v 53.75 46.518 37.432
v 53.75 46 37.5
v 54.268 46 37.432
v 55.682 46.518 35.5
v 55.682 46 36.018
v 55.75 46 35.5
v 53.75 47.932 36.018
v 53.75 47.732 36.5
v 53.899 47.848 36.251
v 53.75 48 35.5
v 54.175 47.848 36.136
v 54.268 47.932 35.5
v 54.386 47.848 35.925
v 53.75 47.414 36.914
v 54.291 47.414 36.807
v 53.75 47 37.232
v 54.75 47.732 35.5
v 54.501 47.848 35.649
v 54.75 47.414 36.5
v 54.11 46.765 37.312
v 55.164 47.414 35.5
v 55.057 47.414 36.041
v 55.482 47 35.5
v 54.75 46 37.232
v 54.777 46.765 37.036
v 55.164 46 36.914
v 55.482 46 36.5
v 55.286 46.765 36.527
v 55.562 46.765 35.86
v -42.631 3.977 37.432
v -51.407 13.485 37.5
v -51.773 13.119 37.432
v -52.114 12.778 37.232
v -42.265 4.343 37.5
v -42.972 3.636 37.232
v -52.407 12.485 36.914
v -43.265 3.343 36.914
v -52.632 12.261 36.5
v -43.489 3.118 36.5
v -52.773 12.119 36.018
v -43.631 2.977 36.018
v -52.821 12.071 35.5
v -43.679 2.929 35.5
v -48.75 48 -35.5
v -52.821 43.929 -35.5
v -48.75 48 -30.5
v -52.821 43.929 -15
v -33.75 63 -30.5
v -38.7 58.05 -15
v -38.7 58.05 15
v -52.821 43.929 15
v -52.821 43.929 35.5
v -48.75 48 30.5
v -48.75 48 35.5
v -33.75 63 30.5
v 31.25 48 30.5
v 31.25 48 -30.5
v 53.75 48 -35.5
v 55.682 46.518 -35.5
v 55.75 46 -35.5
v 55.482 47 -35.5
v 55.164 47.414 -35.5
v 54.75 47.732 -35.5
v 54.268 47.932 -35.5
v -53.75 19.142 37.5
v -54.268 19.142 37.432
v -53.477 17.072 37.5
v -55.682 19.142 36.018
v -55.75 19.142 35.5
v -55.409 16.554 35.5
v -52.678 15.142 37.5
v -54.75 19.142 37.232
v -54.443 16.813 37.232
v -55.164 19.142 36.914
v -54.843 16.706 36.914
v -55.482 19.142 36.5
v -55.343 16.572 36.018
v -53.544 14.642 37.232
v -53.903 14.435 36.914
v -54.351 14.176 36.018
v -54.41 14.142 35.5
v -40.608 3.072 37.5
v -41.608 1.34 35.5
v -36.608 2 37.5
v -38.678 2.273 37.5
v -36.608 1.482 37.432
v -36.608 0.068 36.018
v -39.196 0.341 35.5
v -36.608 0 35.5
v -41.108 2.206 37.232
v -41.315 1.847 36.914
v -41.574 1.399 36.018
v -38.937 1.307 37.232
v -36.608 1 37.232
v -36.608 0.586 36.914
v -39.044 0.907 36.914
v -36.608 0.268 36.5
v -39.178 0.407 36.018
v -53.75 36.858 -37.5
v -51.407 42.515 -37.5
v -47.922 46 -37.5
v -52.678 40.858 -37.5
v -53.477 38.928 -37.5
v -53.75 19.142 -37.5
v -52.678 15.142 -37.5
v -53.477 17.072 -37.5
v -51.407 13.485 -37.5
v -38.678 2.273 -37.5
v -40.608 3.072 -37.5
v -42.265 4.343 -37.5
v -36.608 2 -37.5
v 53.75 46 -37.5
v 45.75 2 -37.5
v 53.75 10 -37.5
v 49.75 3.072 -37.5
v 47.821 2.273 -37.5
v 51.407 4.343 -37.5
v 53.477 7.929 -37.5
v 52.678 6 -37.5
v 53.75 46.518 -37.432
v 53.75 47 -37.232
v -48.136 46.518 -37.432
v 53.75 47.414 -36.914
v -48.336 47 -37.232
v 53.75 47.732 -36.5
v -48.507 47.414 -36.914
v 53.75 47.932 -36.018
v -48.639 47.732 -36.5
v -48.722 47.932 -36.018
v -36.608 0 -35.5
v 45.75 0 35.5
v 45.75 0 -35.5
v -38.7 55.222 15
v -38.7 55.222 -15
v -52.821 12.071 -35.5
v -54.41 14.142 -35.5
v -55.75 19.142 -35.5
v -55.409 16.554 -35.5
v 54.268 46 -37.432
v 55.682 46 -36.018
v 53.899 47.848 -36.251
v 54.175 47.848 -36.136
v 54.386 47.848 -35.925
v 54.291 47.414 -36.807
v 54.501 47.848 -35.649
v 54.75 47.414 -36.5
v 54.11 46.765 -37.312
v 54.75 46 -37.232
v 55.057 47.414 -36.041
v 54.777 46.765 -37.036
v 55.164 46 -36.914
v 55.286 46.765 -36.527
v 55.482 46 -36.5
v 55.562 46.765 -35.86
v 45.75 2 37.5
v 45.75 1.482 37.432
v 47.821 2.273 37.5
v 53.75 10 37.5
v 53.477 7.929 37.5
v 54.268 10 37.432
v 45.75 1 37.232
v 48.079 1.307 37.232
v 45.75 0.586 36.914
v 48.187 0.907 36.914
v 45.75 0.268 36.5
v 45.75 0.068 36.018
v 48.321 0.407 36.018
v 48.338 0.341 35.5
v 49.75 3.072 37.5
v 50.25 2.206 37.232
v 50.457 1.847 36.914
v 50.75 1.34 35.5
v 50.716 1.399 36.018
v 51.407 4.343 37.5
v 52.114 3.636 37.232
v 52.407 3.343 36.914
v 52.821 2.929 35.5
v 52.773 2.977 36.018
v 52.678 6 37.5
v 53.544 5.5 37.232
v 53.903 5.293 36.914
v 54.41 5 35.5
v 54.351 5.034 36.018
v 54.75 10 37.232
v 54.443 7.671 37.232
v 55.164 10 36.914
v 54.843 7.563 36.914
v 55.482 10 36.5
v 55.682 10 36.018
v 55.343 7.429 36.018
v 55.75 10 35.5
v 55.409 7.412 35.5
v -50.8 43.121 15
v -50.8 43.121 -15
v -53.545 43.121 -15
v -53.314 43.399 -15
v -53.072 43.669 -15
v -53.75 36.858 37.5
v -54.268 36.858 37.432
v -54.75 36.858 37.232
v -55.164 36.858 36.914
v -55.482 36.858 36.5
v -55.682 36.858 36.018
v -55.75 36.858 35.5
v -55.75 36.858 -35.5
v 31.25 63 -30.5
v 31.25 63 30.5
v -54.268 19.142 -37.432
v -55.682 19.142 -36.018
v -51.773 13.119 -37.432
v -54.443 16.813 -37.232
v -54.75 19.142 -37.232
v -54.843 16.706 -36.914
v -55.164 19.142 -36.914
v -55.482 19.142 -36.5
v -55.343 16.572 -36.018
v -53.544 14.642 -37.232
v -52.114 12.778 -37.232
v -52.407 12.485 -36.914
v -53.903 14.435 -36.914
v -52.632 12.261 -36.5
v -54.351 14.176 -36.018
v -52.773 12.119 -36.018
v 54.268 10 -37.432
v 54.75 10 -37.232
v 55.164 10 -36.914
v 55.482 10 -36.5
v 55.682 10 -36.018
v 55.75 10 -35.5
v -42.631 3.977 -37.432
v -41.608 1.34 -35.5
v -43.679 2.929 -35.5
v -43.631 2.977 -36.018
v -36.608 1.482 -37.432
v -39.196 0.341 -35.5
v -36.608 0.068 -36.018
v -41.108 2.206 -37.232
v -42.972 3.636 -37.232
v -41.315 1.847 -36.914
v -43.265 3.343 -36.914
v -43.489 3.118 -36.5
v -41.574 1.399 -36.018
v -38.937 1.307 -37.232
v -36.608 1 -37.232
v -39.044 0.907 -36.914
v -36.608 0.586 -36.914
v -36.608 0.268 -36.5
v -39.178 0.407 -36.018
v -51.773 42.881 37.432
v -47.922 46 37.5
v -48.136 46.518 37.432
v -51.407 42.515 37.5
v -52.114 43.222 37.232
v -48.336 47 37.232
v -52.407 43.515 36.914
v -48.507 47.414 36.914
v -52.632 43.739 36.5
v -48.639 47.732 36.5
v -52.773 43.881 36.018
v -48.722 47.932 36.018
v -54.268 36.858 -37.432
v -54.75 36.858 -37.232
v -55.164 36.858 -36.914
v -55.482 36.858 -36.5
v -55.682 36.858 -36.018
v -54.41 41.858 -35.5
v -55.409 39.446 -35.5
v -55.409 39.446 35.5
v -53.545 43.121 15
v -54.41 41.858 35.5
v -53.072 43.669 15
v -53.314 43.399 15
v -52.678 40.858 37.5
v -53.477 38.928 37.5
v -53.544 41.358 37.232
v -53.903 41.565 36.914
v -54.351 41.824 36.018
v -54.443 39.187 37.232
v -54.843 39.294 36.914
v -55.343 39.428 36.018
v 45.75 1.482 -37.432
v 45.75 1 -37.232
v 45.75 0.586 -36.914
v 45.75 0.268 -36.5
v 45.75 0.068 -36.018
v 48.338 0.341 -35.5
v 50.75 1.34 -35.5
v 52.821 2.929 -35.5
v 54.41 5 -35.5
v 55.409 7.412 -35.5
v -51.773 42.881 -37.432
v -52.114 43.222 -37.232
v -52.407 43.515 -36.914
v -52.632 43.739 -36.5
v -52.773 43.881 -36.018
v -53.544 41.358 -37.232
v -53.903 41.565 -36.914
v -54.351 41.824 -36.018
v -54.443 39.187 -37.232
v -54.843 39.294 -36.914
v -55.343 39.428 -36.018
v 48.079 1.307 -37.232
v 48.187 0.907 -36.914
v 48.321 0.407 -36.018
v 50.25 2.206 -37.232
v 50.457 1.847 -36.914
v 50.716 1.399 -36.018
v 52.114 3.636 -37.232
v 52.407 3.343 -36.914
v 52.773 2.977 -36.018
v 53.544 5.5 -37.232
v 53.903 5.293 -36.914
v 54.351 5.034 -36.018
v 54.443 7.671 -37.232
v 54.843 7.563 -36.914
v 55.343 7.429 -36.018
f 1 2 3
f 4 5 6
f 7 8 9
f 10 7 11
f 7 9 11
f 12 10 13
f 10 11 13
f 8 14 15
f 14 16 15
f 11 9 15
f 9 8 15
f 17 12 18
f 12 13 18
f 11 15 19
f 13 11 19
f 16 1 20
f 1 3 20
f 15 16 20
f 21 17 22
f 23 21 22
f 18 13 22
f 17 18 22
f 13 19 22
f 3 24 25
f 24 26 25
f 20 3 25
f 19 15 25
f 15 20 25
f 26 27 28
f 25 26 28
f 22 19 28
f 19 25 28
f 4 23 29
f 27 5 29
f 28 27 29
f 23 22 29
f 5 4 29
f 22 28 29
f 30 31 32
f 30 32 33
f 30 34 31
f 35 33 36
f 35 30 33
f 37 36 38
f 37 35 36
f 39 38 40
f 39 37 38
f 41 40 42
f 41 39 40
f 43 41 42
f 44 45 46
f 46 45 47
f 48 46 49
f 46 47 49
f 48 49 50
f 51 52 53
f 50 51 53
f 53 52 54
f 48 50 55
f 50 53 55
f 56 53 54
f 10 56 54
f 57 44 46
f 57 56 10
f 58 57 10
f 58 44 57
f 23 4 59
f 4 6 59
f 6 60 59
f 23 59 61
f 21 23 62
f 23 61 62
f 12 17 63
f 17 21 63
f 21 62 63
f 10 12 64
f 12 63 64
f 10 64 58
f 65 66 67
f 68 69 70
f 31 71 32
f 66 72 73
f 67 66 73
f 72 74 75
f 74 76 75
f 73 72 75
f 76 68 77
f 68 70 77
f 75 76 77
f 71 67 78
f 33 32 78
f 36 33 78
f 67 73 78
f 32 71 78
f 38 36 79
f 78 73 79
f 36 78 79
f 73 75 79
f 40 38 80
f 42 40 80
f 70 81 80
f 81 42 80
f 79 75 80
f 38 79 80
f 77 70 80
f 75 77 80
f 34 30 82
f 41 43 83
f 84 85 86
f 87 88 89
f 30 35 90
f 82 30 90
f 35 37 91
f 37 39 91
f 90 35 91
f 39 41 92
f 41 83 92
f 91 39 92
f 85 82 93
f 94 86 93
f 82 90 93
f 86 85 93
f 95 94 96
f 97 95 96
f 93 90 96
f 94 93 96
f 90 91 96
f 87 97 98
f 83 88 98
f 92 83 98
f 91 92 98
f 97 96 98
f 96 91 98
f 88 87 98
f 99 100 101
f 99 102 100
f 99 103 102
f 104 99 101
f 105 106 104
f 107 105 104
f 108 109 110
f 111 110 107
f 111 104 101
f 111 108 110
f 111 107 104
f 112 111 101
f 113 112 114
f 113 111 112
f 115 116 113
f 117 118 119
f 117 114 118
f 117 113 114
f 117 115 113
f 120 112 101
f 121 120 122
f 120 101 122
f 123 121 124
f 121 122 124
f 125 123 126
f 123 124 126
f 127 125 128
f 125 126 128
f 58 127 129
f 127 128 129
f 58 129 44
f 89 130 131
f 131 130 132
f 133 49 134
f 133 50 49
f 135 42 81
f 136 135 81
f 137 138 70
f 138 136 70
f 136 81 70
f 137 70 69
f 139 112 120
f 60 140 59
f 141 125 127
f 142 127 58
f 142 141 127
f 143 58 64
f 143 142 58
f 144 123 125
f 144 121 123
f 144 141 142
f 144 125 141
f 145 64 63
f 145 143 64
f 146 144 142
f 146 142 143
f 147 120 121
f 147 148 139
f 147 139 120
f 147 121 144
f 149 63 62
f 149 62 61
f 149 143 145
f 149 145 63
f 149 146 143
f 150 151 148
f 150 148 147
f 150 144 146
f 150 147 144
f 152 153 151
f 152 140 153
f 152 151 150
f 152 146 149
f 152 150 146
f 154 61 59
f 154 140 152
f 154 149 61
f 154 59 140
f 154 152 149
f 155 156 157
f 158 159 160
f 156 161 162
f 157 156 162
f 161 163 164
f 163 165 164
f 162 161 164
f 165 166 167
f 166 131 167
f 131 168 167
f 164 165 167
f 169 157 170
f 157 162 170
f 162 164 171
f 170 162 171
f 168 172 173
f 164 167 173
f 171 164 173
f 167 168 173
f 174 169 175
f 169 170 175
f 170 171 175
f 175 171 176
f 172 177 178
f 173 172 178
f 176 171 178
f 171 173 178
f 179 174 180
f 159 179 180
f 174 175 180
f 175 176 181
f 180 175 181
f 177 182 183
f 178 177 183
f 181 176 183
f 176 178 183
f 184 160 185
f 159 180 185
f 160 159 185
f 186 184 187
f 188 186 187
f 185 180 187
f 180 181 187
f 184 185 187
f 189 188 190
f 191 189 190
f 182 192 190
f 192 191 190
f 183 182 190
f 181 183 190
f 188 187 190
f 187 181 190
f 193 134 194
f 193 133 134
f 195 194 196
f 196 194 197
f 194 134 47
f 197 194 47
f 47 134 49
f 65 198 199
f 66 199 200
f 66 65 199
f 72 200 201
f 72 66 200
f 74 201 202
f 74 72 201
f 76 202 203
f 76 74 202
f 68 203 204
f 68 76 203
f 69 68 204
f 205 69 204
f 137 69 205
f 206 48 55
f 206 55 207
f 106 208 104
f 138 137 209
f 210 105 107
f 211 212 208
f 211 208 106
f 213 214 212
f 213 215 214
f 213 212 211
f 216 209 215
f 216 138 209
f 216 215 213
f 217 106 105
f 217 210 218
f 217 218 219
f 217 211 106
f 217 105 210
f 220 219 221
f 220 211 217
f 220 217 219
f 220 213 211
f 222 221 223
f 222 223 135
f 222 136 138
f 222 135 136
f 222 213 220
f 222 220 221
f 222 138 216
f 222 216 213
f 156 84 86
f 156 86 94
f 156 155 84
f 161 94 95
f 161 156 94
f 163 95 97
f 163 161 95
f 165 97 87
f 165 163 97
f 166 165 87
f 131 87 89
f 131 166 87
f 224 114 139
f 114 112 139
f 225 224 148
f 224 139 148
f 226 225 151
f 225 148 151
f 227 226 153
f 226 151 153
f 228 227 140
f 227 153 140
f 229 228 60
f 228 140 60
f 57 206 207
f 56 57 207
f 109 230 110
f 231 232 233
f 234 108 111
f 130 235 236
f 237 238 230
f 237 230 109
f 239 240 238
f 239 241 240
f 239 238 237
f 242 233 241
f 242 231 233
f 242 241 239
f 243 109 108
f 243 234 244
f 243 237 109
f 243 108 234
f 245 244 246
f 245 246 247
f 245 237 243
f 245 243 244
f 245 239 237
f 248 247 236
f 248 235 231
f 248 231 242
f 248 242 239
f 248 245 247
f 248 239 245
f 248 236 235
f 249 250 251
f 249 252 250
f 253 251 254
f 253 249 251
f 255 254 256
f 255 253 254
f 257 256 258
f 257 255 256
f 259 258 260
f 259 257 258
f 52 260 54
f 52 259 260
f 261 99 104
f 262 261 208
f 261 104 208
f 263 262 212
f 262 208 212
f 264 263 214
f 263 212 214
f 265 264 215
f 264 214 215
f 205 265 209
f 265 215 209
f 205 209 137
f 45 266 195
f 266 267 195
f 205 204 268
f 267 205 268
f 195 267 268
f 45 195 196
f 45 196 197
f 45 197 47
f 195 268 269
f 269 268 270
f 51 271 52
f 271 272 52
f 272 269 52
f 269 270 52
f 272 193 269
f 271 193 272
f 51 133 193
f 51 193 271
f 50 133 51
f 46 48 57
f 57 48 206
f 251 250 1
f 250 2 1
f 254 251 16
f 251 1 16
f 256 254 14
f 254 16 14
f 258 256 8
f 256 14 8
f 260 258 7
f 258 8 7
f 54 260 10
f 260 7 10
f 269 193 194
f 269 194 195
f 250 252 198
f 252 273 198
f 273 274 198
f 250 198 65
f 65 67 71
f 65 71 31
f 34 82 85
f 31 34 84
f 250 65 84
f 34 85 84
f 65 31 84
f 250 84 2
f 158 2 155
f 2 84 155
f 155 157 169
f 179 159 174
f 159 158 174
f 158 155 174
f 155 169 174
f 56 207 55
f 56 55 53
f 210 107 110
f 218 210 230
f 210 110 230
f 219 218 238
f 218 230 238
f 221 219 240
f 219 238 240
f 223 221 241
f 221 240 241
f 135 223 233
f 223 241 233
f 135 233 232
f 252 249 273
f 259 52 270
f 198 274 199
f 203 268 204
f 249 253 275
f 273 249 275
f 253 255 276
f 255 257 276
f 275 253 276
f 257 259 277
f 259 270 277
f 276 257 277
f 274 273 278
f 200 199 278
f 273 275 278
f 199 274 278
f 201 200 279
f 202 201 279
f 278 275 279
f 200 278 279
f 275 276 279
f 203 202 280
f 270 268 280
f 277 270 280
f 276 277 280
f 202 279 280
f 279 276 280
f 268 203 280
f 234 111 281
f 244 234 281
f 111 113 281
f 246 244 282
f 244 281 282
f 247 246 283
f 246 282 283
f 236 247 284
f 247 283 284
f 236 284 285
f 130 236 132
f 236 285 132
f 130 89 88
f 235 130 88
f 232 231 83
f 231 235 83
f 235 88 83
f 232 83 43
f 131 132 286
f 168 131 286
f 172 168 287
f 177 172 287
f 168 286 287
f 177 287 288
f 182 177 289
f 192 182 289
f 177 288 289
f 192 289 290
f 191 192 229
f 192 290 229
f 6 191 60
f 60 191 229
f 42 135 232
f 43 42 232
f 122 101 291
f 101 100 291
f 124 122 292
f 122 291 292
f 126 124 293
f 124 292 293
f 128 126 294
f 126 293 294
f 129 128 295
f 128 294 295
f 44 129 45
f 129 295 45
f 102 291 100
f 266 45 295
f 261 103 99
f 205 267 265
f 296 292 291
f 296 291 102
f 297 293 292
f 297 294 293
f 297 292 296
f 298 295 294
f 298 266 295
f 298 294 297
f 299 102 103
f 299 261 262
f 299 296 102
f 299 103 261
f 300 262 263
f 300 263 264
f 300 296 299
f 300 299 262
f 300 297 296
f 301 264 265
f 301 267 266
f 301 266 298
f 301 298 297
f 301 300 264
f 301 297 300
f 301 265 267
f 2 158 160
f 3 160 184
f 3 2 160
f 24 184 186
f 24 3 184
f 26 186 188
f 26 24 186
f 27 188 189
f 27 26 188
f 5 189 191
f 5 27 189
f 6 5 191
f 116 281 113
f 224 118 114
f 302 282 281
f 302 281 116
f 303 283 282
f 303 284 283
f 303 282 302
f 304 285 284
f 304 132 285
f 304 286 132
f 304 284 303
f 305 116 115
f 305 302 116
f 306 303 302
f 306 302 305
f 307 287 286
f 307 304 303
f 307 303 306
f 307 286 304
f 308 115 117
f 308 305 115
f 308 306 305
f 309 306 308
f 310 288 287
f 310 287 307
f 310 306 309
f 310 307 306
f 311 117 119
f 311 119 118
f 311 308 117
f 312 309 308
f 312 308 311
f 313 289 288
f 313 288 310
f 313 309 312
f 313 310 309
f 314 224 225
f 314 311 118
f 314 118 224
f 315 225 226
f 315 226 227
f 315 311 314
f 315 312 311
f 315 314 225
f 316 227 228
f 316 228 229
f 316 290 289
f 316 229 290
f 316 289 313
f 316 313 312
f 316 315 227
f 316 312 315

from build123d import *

# Parameters (mm, degrees)
SKETCH1_W           = 111.5
SKETCH1_H           = 75
BOSS_EXTRUDE1_DEPTH = 63
CUT_EXTRUDE1_REACH  = 114.703
SKETCH3_W           = 22
SKETCH3_H           = 7
CUT_EXTRUDE2_DEPTH  = 15
CUT_EXTRUDE3_DEPTH  = 15
FILLET1_R           = 10
FILLET2_R           = 2


with BuildPart() as part:
    # Sketch1 → Boss-Extrude1 (new body)
    with BuildSketch(Plane(origin=(0, 0, 0), x_dir=(1, 0, 0), z_dir=(0, 1, 0))):
        Rectangle(SKETCH1_W, SKETCH1_H)
    extrude(amount=BOSS_EXTRUDE1_DEPTH)

    # Sketch2 → Cut-Extrude1 (cut, up to next)
    with BuildSketch(Plane.XY.offset(37.5), mode=Mode.PRIVATE) as cut_extrude1_sk1:
        Polygon((-55.75, 41), (-33.75, 63), (-55.75, 63), align=None)
    cut_extrude1_tool1 = extrude(cut_extrude1_sk1.sketch, amount=-CUT_EXTRUDE1_REACH, mode=Mode.PRIVATE) & part.part
    # Sketch2 → Cut-Extrude1 (cut, up to next)
    with BuildSketch(Plane.XY.offset(37.5), mode=Mode.PRIVATE) as cut_extrude1_sk2:
        Polygon((-55.75, 15), (-40.75, 0), (-55.75, 0), align=None)
    cut_extrude1_tool2 = extrude(cut_extrude1_sk2.sketch, amount=-CUT_EXTRUDE1_REACH, mode=Mode.PRIVATE) & part.part
    add(cut_extrude1_tool1.solids().sort_by_distance((-48.416667, 55.666667, 37.5))[0], mode=Mode.SUBTRACT)
    add(cut_extrude1_tool2.solids().sort_by_distance((-50.75, 5, 37.5))[0], mode=Mode.SUBTRACT)

    # Sketch3 → Cut-Extrude2 (cut)
    with BuildSketch(Plane(origin=(0, 63, 0), x_dir=(1, 0, 0), z_dir=(0, 1, 0))):
        Polygon((31.25, -30.5), (-33.75, -30.5), (-33.75, -37.5), (55.75, -37.5), (55.75, 37.5), (-33.75, 37.5), (-33.75, 30.5), (31.25, 30.5), align=None)
        with Locations((-44.75, -34)):
            Rectangle(SKETCH3_W, SKETCH3_H)
        with Locations((-44.75, 34)):
            Rectangle(SKETCH3_W, SKETCH3_H)
    extrude(amount=-CUT_EXTRUDE2_DEPTH, mode=Mode.SUBTRACT)

    # Sketch4 → Cut-Extrude3 (cut, symmetric)
    with BuildSketch(Plane.XY):
        Polygon((-53.628679656, 43.121320344), (-38.699747468, 58.050252532), (-38.699747468, 55.221825407), (-50.800252532, 43.121320344), align=None)
    extrude(amount=CUT_EXTRUDE3_DEPTH, both=True, mode=Mode.SUBTRACT)

    # Fillet1
    # the kernel refuses this fillet: 10 mm, written as the material it takes off along each edge
    with BuildSketch(Plane(origin=(-55.75, 41, 47.855339059), x_dir=(0.7071067811865432, 0.7071067811865519, 0), z_dir=(0, 0, -1)), Plane(origin=(-40.75, 0, 47.855339059), x_dir=(-0.707106781186546, 0.707106781186549, 0), z_dir=(0, 0, -1))) as fillet1_piece_1:
        with BuildLine():
            CenterArc((FILLET1_R * 0.414213562373, FILLET1_R), FILLET1_R, 225, 45)
            Line((-FILLET1_R * 0.292893218813, FILLET1_R * 0.292893218813), (0, 0))
            Line((0, 0), (FILLET1_R * 0.414213562373, 0))
        make_face()
    extrude(amount=95.710678119, mode=Mode.SUBTRACT)
    with BuildSketch(Plane(origin=(-55.75, 15, 47.855339059), x_dir=(0.7071067811865466, -0.7071067811865482, 0), z_dir=(0, 0, -1))) as fillet1_piece_2:
        with BuildLine():
            CenterArc((FILLET1_R * 0.414213562373, -FILLET1_R), FILLET1_R, 90, 45)
            Line((-FILLET1_R * 0.292893218813, -FILLET1_R * 0.292893218813), (0, 0))
            Line((0, 0), (FILLET1_R * 0.414213562373, 0))
        make_face()
    extrude(amount=95.710678119, mode=Mode.SUBTRACT)
    with BuildSketch(Plane(origin=(55.75, 0, -62.5), x_dir=(-1, 0, 0), z_dir=(0, 0, 1))) as fillet1_piece_3:
        with BuildLine():
            CenterArc((FILLET1_R, -FILLET1_R), FILLET1_R, 90, 90)
            Line((0, -FILLET1_R), (0, 0))
            Line((0, 0), (FILLET1_R, 0))
        make_face()
    extrude(amount=125, mode=Mode.SUBTRACT)

    # Fillet2
    fillet2_edges = [part.edges().sort_by_distance(p)[0] for p in [
        (4.571067812, 0, -37.5),
        (-48.25, 7.5, -37.5),
        (52.821067812, 2.928932188, -37.5),
        (-40.4346987, 0.761204675, -37.5),
        (-54.988795325, 15.3153013, -37.5),
        (-54.988795325, 40.6846987, -37.5),
        (-50.785533906, 45.964466094, -37.5),
        (55.75, 29, 37.5),
        (55.75, 29, -37.5),
        (3.5, 48, -37.5),
        (3.5, 48, 37.5),
        (55.75, 48, 0),
        (-50.785533906, 45.964466094, 37.5),
        (-55.75, 28, 37.5),
        (-48.25, 7.5, 37.5),
        (4.571067812, 0, 37.5),
        (52.821067812, 2.928932188, 37.5),
        (-40.4346987, 0.761204675, 37.5),
        (-54.988795325, 15.3153013, 37.5),
        (-54.988795325, 40.6846987, 37.5),
        (-55.75, 28, -37.5),
    ]]
    fillet(fillet2_edges, radius=FILLET2_R)


solid = part.part
